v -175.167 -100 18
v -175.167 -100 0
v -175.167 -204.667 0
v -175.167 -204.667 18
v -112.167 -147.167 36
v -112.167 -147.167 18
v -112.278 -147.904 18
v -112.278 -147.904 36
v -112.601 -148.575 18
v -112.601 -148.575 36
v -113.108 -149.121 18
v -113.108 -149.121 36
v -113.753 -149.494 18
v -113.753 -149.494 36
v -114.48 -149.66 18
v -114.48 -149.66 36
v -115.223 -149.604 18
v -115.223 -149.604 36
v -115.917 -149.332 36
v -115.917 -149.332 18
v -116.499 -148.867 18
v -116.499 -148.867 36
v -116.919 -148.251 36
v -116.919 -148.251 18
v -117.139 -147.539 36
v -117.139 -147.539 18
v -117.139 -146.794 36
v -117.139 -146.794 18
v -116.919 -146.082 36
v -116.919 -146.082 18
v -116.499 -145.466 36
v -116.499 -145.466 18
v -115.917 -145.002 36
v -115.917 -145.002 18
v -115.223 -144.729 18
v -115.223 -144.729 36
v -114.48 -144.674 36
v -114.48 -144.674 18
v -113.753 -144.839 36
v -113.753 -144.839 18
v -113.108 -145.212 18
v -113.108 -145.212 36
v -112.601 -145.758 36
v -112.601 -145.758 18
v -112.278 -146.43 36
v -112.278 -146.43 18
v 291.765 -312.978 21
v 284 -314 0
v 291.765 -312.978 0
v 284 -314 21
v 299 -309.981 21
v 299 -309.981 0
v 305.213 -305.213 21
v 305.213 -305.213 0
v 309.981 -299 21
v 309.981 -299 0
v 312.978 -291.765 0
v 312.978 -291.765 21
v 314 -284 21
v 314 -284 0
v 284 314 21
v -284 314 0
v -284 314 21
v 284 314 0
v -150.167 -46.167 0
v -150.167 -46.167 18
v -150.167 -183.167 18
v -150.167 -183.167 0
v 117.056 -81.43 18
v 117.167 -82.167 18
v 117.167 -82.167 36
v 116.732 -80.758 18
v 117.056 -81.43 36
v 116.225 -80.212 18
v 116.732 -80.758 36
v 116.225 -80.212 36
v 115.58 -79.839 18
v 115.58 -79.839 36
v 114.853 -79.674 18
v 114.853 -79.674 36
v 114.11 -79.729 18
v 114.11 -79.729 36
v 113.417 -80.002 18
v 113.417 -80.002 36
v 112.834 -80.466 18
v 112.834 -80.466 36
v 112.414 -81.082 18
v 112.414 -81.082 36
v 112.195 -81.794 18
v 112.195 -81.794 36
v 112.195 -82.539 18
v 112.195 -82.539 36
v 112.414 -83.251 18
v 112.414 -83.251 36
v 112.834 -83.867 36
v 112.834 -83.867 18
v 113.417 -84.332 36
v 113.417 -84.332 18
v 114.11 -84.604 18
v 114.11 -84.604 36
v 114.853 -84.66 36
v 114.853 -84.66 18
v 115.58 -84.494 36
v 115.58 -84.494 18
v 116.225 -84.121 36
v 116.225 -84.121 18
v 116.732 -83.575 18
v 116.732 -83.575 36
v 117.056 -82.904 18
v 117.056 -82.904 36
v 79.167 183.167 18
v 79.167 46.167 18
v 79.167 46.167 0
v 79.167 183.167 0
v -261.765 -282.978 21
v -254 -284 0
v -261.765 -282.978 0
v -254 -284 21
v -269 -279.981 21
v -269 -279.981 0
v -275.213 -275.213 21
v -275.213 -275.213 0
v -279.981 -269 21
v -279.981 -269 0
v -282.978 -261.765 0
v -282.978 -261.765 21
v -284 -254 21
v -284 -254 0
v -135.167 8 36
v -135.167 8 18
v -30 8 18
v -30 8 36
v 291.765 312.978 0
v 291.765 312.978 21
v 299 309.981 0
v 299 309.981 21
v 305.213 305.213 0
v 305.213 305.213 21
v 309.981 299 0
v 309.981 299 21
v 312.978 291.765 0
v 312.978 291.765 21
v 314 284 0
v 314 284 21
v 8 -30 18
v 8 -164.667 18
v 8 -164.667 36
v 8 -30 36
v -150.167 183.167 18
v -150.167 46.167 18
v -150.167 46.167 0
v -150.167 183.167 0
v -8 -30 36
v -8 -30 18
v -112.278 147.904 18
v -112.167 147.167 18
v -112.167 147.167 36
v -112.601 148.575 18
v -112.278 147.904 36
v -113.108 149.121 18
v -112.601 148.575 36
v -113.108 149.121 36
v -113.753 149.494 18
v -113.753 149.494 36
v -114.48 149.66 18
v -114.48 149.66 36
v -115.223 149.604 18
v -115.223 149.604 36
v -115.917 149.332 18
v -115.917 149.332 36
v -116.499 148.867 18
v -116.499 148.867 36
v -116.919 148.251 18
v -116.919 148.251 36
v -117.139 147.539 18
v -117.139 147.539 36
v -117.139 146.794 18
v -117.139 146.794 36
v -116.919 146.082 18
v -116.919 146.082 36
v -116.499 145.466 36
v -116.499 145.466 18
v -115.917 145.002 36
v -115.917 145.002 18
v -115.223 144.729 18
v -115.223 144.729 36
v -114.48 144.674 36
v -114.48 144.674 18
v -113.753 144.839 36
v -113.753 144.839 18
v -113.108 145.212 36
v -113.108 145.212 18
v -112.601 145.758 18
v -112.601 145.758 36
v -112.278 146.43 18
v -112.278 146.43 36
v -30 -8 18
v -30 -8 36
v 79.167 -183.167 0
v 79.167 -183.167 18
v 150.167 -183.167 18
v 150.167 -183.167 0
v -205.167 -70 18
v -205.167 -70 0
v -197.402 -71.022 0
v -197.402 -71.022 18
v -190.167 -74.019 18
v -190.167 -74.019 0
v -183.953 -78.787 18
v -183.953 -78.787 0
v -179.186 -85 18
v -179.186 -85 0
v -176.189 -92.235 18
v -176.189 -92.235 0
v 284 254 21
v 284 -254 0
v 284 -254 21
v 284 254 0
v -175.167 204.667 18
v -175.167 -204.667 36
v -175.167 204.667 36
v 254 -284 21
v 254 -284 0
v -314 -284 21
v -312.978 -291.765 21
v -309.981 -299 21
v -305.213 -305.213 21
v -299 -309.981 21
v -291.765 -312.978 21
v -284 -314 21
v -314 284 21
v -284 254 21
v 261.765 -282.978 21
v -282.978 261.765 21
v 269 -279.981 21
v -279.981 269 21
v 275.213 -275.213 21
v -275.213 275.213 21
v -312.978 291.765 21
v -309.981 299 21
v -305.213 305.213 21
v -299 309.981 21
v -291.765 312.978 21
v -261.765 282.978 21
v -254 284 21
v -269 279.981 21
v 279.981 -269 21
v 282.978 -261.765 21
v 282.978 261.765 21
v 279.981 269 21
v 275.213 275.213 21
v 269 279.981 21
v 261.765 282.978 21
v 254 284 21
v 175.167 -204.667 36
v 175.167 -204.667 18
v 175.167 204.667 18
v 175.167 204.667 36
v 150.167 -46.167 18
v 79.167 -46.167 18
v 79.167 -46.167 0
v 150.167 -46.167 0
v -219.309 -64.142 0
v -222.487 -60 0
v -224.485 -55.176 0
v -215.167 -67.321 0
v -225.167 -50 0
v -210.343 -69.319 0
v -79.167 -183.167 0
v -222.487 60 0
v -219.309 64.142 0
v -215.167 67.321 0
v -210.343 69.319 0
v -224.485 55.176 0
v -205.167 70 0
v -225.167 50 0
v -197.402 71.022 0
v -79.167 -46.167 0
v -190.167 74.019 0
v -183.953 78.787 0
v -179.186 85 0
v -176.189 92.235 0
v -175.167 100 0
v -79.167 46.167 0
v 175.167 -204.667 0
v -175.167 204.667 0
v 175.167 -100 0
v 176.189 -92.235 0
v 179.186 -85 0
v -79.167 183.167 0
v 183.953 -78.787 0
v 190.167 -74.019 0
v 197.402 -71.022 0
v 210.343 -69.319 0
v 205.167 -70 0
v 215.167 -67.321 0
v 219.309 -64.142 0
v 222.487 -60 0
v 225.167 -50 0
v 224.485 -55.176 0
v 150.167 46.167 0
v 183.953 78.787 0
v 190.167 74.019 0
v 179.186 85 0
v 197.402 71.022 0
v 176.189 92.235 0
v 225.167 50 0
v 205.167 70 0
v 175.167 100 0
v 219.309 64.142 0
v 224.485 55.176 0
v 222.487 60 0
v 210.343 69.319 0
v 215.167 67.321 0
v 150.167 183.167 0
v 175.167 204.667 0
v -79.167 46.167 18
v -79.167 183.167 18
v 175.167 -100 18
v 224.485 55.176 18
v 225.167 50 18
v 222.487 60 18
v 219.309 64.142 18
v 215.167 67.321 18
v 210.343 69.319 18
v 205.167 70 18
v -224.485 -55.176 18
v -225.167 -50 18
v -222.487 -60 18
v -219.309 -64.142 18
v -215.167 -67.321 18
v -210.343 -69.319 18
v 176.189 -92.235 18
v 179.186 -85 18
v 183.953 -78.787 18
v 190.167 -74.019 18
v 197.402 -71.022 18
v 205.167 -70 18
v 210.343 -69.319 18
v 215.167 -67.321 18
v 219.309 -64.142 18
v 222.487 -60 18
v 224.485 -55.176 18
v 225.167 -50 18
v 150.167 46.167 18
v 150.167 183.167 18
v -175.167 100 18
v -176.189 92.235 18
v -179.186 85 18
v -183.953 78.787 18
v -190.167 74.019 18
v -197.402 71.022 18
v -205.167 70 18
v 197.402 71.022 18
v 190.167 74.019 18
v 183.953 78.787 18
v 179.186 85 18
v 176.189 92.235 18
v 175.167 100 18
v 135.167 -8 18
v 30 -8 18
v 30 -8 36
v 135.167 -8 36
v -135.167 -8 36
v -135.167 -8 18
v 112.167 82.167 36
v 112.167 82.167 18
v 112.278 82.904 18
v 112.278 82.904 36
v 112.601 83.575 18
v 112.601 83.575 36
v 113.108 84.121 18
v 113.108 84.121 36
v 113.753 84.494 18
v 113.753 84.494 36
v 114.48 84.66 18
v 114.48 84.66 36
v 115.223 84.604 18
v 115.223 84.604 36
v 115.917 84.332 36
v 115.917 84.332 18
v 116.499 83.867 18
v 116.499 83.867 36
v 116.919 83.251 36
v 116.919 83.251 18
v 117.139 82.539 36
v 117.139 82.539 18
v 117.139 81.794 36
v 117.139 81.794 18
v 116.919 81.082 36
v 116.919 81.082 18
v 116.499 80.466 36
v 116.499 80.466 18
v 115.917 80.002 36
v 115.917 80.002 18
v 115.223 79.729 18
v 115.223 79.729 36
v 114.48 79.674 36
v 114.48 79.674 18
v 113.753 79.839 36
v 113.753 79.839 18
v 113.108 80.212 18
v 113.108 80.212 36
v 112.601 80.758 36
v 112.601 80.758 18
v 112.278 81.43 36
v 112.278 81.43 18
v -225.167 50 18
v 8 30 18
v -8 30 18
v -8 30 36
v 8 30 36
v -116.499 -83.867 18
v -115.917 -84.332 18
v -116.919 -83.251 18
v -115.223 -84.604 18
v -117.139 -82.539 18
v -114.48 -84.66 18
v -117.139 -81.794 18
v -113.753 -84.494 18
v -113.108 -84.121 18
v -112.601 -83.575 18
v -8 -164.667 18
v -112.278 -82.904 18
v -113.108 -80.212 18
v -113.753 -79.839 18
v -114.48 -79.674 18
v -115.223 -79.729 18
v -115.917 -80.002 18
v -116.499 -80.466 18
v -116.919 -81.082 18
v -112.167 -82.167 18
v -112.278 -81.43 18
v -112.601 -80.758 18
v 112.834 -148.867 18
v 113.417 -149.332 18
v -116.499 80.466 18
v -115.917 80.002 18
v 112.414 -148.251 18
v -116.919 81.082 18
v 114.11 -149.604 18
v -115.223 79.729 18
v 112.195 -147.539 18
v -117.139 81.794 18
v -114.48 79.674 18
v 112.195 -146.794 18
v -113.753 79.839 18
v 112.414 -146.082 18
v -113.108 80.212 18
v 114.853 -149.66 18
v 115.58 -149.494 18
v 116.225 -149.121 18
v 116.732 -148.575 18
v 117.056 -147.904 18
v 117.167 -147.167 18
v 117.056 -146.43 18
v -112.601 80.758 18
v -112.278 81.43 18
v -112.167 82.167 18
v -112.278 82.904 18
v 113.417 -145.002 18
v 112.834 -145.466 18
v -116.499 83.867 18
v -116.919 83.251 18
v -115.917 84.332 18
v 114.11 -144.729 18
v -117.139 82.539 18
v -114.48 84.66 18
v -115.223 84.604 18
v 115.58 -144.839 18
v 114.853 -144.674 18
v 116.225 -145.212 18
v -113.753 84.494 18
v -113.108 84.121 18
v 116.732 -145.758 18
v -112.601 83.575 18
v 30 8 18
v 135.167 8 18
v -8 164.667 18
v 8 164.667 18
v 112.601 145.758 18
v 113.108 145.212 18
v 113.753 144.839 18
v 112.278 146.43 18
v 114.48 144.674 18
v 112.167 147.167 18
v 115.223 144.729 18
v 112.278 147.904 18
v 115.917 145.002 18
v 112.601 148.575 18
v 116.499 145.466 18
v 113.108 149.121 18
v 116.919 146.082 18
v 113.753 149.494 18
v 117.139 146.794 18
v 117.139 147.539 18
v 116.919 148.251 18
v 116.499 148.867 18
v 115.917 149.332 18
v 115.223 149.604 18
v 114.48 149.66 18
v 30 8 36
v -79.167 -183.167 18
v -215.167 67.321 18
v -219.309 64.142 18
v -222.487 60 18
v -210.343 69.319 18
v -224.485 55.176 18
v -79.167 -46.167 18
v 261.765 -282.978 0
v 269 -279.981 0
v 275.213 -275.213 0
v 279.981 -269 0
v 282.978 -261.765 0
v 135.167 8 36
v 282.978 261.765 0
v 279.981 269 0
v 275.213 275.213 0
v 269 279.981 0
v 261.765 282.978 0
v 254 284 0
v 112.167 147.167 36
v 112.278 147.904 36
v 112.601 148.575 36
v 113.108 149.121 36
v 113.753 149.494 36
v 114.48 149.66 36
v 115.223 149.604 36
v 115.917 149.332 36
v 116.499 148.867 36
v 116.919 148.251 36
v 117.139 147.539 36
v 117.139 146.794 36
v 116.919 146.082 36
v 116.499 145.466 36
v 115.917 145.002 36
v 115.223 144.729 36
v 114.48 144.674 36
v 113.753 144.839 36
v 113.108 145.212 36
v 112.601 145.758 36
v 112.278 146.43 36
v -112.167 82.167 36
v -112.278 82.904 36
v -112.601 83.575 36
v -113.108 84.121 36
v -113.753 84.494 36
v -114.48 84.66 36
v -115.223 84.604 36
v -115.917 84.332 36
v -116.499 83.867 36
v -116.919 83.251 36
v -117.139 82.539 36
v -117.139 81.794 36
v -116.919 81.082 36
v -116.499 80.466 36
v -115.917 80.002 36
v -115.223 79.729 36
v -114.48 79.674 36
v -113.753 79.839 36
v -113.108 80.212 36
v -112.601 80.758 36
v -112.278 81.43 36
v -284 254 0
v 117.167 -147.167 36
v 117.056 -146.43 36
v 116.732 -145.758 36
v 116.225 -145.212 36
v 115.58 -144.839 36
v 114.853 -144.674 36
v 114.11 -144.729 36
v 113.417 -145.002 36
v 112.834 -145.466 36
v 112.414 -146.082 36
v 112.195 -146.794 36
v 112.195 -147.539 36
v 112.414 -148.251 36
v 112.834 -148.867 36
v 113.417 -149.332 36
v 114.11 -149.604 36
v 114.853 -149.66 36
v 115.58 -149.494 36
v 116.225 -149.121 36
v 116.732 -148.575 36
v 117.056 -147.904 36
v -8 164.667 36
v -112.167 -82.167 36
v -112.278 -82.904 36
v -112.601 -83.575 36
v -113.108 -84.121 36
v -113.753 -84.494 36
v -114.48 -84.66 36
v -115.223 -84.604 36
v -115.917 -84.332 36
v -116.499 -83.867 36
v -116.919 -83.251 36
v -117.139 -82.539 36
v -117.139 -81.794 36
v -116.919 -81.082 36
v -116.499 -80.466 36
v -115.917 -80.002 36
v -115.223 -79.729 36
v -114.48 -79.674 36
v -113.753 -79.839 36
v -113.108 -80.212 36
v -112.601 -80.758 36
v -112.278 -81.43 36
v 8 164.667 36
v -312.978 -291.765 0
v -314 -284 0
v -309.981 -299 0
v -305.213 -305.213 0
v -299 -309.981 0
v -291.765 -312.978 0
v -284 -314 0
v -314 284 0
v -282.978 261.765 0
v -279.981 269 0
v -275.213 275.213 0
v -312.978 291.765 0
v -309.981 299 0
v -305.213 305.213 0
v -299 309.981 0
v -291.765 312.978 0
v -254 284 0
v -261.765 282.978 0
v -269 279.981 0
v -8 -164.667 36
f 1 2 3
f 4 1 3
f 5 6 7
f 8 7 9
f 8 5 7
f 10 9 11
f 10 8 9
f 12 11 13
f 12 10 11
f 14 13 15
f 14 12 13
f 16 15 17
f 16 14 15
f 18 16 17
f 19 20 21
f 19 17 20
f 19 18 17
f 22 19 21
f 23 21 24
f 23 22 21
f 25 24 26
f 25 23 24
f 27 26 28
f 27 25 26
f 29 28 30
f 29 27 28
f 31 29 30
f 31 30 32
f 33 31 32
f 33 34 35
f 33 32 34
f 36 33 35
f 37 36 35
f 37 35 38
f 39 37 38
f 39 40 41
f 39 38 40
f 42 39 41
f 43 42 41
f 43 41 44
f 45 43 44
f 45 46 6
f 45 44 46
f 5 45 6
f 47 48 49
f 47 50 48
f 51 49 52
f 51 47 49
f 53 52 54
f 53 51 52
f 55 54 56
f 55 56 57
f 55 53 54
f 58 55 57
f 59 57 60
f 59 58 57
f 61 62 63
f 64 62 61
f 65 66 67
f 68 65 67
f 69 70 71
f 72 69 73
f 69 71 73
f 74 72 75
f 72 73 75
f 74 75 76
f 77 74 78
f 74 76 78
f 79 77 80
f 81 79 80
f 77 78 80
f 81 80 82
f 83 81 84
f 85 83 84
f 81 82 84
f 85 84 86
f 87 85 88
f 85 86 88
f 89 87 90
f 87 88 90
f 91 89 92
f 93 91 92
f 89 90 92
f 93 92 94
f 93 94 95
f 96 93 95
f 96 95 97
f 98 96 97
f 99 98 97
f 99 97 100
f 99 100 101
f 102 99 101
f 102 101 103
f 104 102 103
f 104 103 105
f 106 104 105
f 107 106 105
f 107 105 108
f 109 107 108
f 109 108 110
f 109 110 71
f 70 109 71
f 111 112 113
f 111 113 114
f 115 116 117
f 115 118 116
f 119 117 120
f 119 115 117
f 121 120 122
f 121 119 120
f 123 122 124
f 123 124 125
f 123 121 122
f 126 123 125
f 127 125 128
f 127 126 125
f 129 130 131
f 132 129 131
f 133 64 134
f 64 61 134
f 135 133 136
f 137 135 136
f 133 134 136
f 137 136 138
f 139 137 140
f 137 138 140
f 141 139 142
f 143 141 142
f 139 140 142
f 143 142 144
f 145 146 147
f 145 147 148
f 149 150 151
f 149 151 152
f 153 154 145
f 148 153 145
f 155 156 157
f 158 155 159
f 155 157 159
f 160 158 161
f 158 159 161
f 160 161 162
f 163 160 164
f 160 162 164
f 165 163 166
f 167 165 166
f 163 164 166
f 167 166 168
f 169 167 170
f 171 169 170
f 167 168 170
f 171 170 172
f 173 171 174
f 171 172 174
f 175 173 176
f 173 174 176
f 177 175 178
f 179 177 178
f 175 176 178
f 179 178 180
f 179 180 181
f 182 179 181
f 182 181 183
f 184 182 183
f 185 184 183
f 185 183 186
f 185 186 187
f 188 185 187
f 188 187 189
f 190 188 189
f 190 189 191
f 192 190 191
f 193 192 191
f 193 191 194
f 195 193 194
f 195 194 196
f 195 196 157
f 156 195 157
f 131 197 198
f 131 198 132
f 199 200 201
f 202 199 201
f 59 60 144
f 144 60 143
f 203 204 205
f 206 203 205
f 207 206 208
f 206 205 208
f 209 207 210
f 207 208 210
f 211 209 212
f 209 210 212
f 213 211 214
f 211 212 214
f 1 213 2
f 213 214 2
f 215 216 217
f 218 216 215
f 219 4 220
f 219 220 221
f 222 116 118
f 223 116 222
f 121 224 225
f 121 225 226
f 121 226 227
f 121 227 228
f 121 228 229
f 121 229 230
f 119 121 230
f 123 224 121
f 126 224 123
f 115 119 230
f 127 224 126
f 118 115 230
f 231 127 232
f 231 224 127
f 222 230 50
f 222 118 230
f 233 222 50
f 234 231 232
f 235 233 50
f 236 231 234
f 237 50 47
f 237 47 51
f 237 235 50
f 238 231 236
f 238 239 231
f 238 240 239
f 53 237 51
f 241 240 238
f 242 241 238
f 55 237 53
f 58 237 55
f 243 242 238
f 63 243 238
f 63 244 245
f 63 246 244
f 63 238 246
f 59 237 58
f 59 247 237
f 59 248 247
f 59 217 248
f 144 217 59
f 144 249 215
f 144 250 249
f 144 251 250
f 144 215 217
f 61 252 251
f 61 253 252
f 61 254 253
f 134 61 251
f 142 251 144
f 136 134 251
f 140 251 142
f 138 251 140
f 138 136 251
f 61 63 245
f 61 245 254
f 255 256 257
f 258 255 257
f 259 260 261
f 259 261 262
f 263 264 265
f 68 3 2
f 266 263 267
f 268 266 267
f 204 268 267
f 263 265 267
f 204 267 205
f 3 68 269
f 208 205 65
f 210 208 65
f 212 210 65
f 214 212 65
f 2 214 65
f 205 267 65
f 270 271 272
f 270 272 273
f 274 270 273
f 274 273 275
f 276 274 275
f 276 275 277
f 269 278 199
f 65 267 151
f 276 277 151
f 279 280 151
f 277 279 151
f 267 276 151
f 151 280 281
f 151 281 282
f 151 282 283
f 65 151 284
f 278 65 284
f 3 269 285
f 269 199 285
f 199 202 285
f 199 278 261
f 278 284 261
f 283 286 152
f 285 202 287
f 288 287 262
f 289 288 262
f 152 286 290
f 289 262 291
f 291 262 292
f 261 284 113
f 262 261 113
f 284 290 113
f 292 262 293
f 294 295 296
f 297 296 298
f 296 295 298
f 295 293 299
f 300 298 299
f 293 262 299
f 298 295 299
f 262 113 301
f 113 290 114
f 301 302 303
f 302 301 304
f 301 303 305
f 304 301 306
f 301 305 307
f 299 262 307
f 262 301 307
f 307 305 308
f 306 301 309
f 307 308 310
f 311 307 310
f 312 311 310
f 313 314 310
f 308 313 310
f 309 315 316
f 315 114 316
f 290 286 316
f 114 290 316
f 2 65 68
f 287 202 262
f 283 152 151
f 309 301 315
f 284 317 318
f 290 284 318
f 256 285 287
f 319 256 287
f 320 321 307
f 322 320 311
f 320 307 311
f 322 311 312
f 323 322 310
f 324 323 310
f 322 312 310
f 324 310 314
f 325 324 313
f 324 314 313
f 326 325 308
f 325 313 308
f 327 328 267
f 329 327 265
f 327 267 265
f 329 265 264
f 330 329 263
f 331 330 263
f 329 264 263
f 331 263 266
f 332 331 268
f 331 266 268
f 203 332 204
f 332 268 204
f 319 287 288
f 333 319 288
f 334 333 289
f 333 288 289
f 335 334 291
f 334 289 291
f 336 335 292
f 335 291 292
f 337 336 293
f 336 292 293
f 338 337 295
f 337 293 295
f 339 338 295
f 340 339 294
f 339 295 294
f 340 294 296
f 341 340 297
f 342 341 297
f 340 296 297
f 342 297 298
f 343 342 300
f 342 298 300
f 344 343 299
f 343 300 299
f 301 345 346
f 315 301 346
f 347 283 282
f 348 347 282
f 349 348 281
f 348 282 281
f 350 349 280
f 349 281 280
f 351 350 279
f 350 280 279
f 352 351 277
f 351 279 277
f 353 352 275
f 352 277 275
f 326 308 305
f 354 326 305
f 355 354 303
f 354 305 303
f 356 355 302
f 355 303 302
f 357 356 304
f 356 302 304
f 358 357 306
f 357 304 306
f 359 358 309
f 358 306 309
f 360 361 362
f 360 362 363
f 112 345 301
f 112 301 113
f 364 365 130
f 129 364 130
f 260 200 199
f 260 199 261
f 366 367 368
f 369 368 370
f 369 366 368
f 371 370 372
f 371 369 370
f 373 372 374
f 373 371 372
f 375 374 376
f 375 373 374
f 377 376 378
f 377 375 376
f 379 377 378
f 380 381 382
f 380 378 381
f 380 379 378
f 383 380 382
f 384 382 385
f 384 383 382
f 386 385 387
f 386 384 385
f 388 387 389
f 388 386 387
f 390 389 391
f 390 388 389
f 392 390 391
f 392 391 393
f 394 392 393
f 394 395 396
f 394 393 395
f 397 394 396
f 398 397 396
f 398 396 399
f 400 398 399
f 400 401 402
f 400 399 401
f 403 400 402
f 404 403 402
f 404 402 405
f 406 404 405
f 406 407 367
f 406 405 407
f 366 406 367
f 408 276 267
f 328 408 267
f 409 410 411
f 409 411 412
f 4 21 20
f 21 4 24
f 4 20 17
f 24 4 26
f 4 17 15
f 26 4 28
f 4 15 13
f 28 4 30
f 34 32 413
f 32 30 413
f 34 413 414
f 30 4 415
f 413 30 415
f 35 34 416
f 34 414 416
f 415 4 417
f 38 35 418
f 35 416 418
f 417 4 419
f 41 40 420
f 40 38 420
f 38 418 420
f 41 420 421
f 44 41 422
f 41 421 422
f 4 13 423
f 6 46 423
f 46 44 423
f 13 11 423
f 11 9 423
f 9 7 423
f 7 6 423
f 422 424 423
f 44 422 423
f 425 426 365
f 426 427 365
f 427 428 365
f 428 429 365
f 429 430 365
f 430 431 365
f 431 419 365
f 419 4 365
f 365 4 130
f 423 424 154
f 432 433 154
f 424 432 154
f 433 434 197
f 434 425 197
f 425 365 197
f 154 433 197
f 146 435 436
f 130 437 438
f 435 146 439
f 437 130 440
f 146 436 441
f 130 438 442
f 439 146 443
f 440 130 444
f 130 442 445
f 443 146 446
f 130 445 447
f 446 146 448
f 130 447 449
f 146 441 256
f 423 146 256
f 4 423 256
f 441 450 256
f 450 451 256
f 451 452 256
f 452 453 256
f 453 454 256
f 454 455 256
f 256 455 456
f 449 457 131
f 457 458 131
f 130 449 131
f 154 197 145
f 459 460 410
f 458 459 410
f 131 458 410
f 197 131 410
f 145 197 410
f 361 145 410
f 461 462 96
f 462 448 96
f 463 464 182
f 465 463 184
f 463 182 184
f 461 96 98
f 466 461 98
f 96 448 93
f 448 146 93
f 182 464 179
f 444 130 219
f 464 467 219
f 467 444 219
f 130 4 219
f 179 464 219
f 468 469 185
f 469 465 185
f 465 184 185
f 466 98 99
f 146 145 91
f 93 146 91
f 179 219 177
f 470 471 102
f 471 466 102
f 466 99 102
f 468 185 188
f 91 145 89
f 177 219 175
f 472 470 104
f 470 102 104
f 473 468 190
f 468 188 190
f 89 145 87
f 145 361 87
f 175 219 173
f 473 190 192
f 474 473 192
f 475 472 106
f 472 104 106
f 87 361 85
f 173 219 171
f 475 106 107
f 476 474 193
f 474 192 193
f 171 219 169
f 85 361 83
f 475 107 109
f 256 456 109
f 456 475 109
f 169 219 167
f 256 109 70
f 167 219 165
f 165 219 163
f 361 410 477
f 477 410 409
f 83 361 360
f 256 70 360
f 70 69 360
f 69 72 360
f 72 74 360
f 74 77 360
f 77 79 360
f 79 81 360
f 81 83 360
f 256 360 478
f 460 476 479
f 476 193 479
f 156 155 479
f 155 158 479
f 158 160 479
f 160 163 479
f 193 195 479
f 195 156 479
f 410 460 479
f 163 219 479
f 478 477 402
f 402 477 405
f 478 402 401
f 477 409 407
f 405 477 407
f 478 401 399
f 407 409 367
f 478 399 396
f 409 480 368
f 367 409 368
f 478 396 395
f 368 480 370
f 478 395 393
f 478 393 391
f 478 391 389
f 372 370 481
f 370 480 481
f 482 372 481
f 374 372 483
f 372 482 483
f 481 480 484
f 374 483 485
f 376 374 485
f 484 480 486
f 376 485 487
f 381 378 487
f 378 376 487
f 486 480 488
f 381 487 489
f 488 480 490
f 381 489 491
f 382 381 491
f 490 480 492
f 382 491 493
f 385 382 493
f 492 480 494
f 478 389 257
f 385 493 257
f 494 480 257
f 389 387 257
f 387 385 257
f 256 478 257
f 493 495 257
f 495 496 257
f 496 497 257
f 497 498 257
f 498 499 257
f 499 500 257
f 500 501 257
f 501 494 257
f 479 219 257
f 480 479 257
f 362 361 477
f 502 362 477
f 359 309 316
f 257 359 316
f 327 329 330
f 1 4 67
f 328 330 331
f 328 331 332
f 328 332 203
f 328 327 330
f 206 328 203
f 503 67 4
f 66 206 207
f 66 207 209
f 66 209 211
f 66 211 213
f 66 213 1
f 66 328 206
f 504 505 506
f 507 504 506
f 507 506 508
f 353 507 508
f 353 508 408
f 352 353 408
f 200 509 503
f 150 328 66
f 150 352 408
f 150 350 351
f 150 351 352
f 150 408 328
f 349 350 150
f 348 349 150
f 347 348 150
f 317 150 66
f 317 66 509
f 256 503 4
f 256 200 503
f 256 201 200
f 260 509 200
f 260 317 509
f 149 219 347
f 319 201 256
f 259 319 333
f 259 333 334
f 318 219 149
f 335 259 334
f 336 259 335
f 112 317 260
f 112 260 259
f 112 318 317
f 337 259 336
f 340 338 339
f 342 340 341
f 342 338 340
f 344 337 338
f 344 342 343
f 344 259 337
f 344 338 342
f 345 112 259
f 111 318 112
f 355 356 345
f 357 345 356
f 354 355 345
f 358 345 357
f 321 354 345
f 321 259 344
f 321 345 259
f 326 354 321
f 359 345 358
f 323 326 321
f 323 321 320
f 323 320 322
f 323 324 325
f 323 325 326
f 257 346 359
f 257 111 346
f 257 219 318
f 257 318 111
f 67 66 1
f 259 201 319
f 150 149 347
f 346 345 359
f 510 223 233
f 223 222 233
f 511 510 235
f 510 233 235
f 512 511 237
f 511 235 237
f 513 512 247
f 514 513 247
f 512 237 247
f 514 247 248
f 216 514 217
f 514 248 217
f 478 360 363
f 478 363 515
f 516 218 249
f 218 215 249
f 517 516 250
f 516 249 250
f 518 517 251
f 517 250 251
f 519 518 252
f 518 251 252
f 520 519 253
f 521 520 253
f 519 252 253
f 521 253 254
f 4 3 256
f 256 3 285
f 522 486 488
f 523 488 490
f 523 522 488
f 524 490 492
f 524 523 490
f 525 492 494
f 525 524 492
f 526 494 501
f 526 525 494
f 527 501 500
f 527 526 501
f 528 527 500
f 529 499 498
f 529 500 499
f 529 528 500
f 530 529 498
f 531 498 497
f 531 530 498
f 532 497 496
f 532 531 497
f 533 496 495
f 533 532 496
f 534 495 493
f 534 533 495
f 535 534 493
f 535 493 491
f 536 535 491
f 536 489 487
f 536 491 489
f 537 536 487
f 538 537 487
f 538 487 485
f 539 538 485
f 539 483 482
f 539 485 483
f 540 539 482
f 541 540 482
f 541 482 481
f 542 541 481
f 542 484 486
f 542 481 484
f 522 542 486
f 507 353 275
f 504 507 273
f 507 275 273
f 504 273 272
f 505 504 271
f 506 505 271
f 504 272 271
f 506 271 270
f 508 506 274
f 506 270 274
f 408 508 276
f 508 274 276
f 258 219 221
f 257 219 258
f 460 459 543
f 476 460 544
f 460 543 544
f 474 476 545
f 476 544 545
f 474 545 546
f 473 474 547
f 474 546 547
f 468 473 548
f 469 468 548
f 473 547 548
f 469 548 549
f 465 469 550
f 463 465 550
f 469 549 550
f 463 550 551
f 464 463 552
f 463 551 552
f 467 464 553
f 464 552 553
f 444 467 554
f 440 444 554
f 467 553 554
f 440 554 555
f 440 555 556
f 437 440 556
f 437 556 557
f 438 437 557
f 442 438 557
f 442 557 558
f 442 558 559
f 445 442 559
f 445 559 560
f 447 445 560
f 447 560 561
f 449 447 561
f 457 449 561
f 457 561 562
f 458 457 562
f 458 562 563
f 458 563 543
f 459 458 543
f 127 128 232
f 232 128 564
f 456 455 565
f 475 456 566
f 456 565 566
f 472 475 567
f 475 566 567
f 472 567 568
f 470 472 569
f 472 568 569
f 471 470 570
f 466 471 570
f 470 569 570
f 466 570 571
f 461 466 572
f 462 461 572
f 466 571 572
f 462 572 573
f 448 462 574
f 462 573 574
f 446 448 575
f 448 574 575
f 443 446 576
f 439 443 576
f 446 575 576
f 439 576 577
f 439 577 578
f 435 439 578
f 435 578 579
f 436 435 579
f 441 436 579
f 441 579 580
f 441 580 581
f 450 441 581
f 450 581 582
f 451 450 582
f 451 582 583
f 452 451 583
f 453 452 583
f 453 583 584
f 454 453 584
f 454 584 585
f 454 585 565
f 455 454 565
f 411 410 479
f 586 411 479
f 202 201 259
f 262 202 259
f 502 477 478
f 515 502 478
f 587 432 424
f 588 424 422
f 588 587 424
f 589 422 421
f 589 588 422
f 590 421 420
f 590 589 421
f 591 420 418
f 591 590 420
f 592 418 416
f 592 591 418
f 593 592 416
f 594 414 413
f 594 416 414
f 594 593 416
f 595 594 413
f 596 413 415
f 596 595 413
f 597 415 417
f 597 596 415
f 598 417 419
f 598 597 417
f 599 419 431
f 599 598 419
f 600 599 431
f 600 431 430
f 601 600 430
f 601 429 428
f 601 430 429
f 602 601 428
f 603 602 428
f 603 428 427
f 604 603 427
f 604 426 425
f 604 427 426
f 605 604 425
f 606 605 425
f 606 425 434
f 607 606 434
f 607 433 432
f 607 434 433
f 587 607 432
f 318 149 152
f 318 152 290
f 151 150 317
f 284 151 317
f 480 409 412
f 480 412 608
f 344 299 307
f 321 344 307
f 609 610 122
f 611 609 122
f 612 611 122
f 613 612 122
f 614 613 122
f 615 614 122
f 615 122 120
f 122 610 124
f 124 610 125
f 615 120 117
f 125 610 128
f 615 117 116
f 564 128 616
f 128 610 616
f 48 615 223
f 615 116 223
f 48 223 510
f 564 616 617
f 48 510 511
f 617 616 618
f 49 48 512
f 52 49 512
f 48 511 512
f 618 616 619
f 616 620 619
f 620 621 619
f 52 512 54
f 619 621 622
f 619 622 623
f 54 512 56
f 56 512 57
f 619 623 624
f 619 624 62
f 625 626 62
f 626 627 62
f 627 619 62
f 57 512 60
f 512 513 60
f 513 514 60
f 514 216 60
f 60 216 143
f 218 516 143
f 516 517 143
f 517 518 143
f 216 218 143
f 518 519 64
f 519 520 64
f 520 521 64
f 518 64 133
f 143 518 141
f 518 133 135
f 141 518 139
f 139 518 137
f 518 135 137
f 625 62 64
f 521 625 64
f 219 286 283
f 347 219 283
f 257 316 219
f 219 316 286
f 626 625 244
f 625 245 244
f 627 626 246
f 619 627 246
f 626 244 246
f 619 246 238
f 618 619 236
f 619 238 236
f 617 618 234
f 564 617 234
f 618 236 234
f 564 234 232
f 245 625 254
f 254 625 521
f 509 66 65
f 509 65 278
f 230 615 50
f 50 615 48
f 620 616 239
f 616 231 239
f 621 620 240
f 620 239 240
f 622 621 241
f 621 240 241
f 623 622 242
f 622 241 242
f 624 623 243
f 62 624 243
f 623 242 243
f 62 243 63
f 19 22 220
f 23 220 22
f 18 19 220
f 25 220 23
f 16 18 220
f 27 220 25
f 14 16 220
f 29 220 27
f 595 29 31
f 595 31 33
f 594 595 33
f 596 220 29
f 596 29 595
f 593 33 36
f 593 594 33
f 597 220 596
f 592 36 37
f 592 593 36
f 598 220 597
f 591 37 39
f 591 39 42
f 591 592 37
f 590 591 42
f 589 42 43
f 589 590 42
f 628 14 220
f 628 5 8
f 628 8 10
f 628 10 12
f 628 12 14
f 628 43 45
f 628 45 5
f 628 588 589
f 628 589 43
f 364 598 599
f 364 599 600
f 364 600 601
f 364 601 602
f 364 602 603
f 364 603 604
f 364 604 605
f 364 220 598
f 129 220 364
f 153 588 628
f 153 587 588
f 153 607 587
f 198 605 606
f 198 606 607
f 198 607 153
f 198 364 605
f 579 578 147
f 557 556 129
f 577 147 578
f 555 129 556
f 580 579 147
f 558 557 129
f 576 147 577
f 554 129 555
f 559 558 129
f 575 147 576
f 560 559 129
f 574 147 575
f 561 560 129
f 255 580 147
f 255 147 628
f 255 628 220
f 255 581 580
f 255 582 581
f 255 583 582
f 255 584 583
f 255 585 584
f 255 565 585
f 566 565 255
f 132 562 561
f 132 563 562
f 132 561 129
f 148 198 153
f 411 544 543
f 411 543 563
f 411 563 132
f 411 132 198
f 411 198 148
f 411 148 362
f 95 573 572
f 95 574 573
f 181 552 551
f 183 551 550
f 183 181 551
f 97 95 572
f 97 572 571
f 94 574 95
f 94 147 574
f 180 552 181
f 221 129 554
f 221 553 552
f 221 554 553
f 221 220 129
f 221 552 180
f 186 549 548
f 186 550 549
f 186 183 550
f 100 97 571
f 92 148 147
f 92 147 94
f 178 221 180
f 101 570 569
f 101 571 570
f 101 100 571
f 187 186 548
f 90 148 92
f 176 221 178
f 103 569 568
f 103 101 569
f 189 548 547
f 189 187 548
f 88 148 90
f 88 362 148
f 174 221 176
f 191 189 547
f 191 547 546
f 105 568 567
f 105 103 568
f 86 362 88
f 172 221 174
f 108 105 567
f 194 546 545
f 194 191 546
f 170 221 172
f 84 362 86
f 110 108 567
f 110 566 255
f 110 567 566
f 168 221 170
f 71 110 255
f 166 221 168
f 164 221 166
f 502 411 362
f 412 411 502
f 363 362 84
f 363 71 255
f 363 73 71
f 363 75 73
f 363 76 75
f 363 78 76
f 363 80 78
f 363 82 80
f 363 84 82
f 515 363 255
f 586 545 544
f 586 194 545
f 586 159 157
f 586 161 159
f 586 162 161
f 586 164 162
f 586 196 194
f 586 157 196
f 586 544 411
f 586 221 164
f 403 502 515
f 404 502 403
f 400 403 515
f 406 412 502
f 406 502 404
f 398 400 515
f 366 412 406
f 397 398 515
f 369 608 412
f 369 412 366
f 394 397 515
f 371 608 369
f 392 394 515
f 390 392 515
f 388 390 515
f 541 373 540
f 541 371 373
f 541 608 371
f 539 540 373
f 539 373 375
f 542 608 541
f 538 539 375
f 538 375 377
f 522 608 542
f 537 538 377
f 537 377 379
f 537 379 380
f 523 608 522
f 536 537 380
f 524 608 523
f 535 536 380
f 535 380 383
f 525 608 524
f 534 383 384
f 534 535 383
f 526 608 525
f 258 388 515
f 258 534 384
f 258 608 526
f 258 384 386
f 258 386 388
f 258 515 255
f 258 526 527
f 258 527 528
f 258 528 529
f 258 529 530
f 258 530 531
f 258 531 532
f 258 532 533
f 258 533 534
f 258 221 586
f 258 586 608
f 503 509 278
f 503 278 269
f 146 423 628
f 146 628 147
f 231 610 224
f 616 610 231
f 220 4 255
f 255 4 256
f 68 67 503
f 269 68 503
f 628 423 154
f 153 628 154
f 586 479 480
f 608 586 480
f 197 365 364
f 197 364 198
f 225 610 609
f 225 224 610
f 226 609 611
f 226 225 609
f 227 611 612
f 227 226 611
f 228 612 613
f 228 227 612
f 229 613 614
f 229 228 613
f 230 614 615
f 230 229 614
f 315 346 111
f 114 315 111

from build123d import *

# Parameters (mm, degrees)
F0_W              = 628
F0_H              = 628
F0_W_2            = 568
F0_H_2            = 568
F1_DEPTH          = 21
F2_R              = 30
F3_R              = 30
F4_W              = 61
F4_H              = 120
F5_DEPTH          = 18
F6_W              = 71
F6_H              = 137
F6_W_2            = 61
F6_H_2            = 120
F7_DEPTH          = 18.001
F7_COPIES2_COUNT  = 2
F7_COPIES2_PITCH  = 324.32631
F8_W              = 350.3333333333
F8_H              = 409.3333333333
F8_W_2            = 16
F8_H_2            = 134.6666666667
F8_W_3            = 105.1666666667
F8_H_3            = 16
F9_DEPTH          = 18
F10_R             = 2.5
F11_DEPTH         = 36.001
F11_COPIES2_COUNT = 2
F11_COPIES2_PITCH = 324.32631


# Not quite as in the source:
# - a pattern or mirror of a feature is missing from the dataset's text; its kind, count and spacing are read off the source's solid


with BuildPart() as f1:
    # F0 (on Top) → F1 (new body)
    with BuildSketch(Plane.XY):
        Rectangle(F0_W, F0_H)
        Rectangle(F0_W_2, F0_H_2, mode=Mode.SUBTRACT)
    extrude(amount=F1_DEPTH)

    # F2
    f2_edges = [f1.edges().sort_by_distance(p)[0] for p in [
        (-284, 284, 10.5),
        (284, 284, 10.5),
        (284, -284, 10.5),
        (-284, -284, 10.5),
    ]]
    fillet(f2_edges, radius=F2_R)

    # F3
    f3_edges = [f1.edges().sort_by_distance(p)[0] for p in [
        (-314, -314, 10.5),
        (314, -314, 10.5),
        (314, 314, 10.5),
        (-314, 314, 10.5),
    ]]
    fillet(f3_edges, radius=F3_R)


with BuildPart() as f5:
    # F4 (on Top) → F5 (new body)
    with BuildSketch(Plane.XY):
        with BuildLine():
            Line((-175.1666666667, -204.6666666667), (175.1666666667, -204.6666666667))
            Line((175.1666666667, -204.6666666667), (175.1666666667, -100))
            ThreePointArc((175.1666666667, -100), (183.9534632311, -78.7867965644), (205.1666666667, -70))
            ThreePointArc((205.1666666667, -70), (219.3088022904, -64.1421356237), (225.1666666667, -50))
            Line((225.1666666667, -50), (225.1666666667, 0))
            Line((225.1666666667, 0), (225.1666666667, 50))
            ThreePointArc((225.1666666667, 50), (219.3088022904, 64.1421356237), (205.1666666667, 70))
            ThreePointArc((205.1666666667, 70), (183.9534632311, 78.7867965644), (175.1666666667, 100))
            Line((175.1666666667, 100), (175.1666666667, 204.6666666667))
            Line((175.1666666667, 204.6666666667), (-175.1666666667, 204.6666666667))
            Line((-175.1666666667, 204.6666666667), (-175.1666666667, 100))
            ThreePointArc((-175.1666666667, 100), (-183.9534632311, 78.7867965644), (-205.1666666667, 70))
            ThreePointArc((-205.1666666667, 70), (-219.3088022904, 64.1421356237), (-225.1666666667, 50))
            Line((-225.1666666667, 50), (-225.1666666667, 0))
            Line((-225.1666666667, 0), (-225.1666666667, -50))
            ThreePointArc((-225.1666666667, -50), (-219.3088022904, -64.1421356237), (-205.1666666667, -70))
            ThreePointArc((-205.1666666667, -70), (-183.9534632311, -78.7867965644), (-175.1666666667, -100))
            Line((-175.1666666667, -100), (-175.1666666667, -204.6666666667))
        make_face()
        Polygon((-145.1666666667, -54.6666666667), (-114.6666666667, -54.6666666667), (-84.1666666667, -54.6666666667), (-84.1666666667, -174.6666666667), (-145.1666666667, -174.6666666667), align=None, mode=Mode.SUBTRACT)
        with Locations((114.6666666667, -114.6666666667)):
            Rectangle(F4_W, F4_H, mode=Mode.SUBTRACT)
        Polygon((-84.1666666667, 174.6666666667), (-84.1666666667, 54.6666666667), (-114.6666666667, 54.6666666667), (-145.1666666667, 54.6666666667), (-145.1666666667, 174.6666666667), align=None, mode=Mode.SUBTRACT)
        with Locations((114.6666666667, 114.6666666667)):
            Rectangle(F4_W, F4_H, mode=Mode.SUBTRACT)
    extrude(amount=F5_DEPTH)

    # F6 (on face) → F7 (cut, through all)
    with BuildSketch(Plane.XY.offset(18)):
        with Locations((-114.6666666667, 114.6666666667)):
            Rectangle(F6_W, F6_H)
        with Locations((-114.6666666667, 114.6666666667)):
            Rectangle(F6_W_2, F6_H_2, mode=Mode.SUBTRACT)
    f7 = extrude(amount=-F7_DEPTH, mode=Mode.SUBTRACT)

    # F7_copies: F7 across plane
    add(f7.mirror(Plane(origin=(0, 0, 0), x_dir=(0, 0, -1), z_dir=(0, -1, 0))), mode=Mode.SUBTRACT)

    # F7_copies1: F7 across plane
    add(f7.mirror(Plane(origin=(0, 0, 0), x_dir=(0, 0, 1), z_dir=(1, 0, 0))), mode=Mode.SUBTRACT)

    # F7_copies2: F7 ×2
    with Locations(*[Vector(0.7071067812, -0.7071067812, 0) * (i * F7_COPIES2_PITCH) for i in range(1, F7_COPIES2_COUNT)]):
        add(f7, mode=Mode.SUBTRACT)


with BuildPart() as f9:
    # F8 (on face) → F9 (new body)
    with BuildSketch(Plane.XY.offset(18)):
        Rectangle(F8_W, F8_H)
        with Locations((0, -97.3333333333)):
            Rectangle(F8_W_2, F8_H_2, mode=Mode.SUBTRACT)
        with Locations((-82.5833333333, 0)):
            Rectangle(F8_W_3, F8_H_3, mode=Mode.SUBTRACT)
        with Locations((0, 97.3333333333)):
            Rectangle(F8_W_2, F8_H_2, mode=Mode.SUBTRACT)
        with Locations((82.5833333333, 0)):
            Rectangle(F8_W_3, F8_H_3, mode=Mode.SUBTRACT)
    extrude(amount=F9_DEPTH)

    # F10 (on face) → F11 (cut, through all)
    with BuildSketch(Plane.XY.offset(36)):
        with Locations((-114.6666666667, 147.1666666667)):
            Circle(F10_R)
        with Locations((-114.6666666667, 82.1666666667)):
            Circle(F10_R)
    f11 = extrude(amount=-F11_DEPTH, mode=Mode.SUBTRACT)

    # F11_copies: F11 across plane
    add(f11.mirror(Plane(origin=(0, 0, 0), x_dir=(0, 0, 1), z_dir=(1, 0, 0))), mode=Mode.SUBTRACT)

    # F11_copies1: F11 across plane
    add(f11.mirror(Plane(origin=(0, 0, 0), x_dir=(0, 0, -1), z_dir=(0, -1, 0))), mode=Mode.SUBTRACT)

    # F11_copies2: F11 ×2
    with Locations(*[Vector(0.7071067812, -0.7071067812, 0) * (i * F11_COPIES2_PITCH) for i in range(1, F11_COPIES2_COUNT)]):
        add(f11, mode=Mode.SUBTRACT)


solid = Compound([f1.part, f5.part, f9.part])
